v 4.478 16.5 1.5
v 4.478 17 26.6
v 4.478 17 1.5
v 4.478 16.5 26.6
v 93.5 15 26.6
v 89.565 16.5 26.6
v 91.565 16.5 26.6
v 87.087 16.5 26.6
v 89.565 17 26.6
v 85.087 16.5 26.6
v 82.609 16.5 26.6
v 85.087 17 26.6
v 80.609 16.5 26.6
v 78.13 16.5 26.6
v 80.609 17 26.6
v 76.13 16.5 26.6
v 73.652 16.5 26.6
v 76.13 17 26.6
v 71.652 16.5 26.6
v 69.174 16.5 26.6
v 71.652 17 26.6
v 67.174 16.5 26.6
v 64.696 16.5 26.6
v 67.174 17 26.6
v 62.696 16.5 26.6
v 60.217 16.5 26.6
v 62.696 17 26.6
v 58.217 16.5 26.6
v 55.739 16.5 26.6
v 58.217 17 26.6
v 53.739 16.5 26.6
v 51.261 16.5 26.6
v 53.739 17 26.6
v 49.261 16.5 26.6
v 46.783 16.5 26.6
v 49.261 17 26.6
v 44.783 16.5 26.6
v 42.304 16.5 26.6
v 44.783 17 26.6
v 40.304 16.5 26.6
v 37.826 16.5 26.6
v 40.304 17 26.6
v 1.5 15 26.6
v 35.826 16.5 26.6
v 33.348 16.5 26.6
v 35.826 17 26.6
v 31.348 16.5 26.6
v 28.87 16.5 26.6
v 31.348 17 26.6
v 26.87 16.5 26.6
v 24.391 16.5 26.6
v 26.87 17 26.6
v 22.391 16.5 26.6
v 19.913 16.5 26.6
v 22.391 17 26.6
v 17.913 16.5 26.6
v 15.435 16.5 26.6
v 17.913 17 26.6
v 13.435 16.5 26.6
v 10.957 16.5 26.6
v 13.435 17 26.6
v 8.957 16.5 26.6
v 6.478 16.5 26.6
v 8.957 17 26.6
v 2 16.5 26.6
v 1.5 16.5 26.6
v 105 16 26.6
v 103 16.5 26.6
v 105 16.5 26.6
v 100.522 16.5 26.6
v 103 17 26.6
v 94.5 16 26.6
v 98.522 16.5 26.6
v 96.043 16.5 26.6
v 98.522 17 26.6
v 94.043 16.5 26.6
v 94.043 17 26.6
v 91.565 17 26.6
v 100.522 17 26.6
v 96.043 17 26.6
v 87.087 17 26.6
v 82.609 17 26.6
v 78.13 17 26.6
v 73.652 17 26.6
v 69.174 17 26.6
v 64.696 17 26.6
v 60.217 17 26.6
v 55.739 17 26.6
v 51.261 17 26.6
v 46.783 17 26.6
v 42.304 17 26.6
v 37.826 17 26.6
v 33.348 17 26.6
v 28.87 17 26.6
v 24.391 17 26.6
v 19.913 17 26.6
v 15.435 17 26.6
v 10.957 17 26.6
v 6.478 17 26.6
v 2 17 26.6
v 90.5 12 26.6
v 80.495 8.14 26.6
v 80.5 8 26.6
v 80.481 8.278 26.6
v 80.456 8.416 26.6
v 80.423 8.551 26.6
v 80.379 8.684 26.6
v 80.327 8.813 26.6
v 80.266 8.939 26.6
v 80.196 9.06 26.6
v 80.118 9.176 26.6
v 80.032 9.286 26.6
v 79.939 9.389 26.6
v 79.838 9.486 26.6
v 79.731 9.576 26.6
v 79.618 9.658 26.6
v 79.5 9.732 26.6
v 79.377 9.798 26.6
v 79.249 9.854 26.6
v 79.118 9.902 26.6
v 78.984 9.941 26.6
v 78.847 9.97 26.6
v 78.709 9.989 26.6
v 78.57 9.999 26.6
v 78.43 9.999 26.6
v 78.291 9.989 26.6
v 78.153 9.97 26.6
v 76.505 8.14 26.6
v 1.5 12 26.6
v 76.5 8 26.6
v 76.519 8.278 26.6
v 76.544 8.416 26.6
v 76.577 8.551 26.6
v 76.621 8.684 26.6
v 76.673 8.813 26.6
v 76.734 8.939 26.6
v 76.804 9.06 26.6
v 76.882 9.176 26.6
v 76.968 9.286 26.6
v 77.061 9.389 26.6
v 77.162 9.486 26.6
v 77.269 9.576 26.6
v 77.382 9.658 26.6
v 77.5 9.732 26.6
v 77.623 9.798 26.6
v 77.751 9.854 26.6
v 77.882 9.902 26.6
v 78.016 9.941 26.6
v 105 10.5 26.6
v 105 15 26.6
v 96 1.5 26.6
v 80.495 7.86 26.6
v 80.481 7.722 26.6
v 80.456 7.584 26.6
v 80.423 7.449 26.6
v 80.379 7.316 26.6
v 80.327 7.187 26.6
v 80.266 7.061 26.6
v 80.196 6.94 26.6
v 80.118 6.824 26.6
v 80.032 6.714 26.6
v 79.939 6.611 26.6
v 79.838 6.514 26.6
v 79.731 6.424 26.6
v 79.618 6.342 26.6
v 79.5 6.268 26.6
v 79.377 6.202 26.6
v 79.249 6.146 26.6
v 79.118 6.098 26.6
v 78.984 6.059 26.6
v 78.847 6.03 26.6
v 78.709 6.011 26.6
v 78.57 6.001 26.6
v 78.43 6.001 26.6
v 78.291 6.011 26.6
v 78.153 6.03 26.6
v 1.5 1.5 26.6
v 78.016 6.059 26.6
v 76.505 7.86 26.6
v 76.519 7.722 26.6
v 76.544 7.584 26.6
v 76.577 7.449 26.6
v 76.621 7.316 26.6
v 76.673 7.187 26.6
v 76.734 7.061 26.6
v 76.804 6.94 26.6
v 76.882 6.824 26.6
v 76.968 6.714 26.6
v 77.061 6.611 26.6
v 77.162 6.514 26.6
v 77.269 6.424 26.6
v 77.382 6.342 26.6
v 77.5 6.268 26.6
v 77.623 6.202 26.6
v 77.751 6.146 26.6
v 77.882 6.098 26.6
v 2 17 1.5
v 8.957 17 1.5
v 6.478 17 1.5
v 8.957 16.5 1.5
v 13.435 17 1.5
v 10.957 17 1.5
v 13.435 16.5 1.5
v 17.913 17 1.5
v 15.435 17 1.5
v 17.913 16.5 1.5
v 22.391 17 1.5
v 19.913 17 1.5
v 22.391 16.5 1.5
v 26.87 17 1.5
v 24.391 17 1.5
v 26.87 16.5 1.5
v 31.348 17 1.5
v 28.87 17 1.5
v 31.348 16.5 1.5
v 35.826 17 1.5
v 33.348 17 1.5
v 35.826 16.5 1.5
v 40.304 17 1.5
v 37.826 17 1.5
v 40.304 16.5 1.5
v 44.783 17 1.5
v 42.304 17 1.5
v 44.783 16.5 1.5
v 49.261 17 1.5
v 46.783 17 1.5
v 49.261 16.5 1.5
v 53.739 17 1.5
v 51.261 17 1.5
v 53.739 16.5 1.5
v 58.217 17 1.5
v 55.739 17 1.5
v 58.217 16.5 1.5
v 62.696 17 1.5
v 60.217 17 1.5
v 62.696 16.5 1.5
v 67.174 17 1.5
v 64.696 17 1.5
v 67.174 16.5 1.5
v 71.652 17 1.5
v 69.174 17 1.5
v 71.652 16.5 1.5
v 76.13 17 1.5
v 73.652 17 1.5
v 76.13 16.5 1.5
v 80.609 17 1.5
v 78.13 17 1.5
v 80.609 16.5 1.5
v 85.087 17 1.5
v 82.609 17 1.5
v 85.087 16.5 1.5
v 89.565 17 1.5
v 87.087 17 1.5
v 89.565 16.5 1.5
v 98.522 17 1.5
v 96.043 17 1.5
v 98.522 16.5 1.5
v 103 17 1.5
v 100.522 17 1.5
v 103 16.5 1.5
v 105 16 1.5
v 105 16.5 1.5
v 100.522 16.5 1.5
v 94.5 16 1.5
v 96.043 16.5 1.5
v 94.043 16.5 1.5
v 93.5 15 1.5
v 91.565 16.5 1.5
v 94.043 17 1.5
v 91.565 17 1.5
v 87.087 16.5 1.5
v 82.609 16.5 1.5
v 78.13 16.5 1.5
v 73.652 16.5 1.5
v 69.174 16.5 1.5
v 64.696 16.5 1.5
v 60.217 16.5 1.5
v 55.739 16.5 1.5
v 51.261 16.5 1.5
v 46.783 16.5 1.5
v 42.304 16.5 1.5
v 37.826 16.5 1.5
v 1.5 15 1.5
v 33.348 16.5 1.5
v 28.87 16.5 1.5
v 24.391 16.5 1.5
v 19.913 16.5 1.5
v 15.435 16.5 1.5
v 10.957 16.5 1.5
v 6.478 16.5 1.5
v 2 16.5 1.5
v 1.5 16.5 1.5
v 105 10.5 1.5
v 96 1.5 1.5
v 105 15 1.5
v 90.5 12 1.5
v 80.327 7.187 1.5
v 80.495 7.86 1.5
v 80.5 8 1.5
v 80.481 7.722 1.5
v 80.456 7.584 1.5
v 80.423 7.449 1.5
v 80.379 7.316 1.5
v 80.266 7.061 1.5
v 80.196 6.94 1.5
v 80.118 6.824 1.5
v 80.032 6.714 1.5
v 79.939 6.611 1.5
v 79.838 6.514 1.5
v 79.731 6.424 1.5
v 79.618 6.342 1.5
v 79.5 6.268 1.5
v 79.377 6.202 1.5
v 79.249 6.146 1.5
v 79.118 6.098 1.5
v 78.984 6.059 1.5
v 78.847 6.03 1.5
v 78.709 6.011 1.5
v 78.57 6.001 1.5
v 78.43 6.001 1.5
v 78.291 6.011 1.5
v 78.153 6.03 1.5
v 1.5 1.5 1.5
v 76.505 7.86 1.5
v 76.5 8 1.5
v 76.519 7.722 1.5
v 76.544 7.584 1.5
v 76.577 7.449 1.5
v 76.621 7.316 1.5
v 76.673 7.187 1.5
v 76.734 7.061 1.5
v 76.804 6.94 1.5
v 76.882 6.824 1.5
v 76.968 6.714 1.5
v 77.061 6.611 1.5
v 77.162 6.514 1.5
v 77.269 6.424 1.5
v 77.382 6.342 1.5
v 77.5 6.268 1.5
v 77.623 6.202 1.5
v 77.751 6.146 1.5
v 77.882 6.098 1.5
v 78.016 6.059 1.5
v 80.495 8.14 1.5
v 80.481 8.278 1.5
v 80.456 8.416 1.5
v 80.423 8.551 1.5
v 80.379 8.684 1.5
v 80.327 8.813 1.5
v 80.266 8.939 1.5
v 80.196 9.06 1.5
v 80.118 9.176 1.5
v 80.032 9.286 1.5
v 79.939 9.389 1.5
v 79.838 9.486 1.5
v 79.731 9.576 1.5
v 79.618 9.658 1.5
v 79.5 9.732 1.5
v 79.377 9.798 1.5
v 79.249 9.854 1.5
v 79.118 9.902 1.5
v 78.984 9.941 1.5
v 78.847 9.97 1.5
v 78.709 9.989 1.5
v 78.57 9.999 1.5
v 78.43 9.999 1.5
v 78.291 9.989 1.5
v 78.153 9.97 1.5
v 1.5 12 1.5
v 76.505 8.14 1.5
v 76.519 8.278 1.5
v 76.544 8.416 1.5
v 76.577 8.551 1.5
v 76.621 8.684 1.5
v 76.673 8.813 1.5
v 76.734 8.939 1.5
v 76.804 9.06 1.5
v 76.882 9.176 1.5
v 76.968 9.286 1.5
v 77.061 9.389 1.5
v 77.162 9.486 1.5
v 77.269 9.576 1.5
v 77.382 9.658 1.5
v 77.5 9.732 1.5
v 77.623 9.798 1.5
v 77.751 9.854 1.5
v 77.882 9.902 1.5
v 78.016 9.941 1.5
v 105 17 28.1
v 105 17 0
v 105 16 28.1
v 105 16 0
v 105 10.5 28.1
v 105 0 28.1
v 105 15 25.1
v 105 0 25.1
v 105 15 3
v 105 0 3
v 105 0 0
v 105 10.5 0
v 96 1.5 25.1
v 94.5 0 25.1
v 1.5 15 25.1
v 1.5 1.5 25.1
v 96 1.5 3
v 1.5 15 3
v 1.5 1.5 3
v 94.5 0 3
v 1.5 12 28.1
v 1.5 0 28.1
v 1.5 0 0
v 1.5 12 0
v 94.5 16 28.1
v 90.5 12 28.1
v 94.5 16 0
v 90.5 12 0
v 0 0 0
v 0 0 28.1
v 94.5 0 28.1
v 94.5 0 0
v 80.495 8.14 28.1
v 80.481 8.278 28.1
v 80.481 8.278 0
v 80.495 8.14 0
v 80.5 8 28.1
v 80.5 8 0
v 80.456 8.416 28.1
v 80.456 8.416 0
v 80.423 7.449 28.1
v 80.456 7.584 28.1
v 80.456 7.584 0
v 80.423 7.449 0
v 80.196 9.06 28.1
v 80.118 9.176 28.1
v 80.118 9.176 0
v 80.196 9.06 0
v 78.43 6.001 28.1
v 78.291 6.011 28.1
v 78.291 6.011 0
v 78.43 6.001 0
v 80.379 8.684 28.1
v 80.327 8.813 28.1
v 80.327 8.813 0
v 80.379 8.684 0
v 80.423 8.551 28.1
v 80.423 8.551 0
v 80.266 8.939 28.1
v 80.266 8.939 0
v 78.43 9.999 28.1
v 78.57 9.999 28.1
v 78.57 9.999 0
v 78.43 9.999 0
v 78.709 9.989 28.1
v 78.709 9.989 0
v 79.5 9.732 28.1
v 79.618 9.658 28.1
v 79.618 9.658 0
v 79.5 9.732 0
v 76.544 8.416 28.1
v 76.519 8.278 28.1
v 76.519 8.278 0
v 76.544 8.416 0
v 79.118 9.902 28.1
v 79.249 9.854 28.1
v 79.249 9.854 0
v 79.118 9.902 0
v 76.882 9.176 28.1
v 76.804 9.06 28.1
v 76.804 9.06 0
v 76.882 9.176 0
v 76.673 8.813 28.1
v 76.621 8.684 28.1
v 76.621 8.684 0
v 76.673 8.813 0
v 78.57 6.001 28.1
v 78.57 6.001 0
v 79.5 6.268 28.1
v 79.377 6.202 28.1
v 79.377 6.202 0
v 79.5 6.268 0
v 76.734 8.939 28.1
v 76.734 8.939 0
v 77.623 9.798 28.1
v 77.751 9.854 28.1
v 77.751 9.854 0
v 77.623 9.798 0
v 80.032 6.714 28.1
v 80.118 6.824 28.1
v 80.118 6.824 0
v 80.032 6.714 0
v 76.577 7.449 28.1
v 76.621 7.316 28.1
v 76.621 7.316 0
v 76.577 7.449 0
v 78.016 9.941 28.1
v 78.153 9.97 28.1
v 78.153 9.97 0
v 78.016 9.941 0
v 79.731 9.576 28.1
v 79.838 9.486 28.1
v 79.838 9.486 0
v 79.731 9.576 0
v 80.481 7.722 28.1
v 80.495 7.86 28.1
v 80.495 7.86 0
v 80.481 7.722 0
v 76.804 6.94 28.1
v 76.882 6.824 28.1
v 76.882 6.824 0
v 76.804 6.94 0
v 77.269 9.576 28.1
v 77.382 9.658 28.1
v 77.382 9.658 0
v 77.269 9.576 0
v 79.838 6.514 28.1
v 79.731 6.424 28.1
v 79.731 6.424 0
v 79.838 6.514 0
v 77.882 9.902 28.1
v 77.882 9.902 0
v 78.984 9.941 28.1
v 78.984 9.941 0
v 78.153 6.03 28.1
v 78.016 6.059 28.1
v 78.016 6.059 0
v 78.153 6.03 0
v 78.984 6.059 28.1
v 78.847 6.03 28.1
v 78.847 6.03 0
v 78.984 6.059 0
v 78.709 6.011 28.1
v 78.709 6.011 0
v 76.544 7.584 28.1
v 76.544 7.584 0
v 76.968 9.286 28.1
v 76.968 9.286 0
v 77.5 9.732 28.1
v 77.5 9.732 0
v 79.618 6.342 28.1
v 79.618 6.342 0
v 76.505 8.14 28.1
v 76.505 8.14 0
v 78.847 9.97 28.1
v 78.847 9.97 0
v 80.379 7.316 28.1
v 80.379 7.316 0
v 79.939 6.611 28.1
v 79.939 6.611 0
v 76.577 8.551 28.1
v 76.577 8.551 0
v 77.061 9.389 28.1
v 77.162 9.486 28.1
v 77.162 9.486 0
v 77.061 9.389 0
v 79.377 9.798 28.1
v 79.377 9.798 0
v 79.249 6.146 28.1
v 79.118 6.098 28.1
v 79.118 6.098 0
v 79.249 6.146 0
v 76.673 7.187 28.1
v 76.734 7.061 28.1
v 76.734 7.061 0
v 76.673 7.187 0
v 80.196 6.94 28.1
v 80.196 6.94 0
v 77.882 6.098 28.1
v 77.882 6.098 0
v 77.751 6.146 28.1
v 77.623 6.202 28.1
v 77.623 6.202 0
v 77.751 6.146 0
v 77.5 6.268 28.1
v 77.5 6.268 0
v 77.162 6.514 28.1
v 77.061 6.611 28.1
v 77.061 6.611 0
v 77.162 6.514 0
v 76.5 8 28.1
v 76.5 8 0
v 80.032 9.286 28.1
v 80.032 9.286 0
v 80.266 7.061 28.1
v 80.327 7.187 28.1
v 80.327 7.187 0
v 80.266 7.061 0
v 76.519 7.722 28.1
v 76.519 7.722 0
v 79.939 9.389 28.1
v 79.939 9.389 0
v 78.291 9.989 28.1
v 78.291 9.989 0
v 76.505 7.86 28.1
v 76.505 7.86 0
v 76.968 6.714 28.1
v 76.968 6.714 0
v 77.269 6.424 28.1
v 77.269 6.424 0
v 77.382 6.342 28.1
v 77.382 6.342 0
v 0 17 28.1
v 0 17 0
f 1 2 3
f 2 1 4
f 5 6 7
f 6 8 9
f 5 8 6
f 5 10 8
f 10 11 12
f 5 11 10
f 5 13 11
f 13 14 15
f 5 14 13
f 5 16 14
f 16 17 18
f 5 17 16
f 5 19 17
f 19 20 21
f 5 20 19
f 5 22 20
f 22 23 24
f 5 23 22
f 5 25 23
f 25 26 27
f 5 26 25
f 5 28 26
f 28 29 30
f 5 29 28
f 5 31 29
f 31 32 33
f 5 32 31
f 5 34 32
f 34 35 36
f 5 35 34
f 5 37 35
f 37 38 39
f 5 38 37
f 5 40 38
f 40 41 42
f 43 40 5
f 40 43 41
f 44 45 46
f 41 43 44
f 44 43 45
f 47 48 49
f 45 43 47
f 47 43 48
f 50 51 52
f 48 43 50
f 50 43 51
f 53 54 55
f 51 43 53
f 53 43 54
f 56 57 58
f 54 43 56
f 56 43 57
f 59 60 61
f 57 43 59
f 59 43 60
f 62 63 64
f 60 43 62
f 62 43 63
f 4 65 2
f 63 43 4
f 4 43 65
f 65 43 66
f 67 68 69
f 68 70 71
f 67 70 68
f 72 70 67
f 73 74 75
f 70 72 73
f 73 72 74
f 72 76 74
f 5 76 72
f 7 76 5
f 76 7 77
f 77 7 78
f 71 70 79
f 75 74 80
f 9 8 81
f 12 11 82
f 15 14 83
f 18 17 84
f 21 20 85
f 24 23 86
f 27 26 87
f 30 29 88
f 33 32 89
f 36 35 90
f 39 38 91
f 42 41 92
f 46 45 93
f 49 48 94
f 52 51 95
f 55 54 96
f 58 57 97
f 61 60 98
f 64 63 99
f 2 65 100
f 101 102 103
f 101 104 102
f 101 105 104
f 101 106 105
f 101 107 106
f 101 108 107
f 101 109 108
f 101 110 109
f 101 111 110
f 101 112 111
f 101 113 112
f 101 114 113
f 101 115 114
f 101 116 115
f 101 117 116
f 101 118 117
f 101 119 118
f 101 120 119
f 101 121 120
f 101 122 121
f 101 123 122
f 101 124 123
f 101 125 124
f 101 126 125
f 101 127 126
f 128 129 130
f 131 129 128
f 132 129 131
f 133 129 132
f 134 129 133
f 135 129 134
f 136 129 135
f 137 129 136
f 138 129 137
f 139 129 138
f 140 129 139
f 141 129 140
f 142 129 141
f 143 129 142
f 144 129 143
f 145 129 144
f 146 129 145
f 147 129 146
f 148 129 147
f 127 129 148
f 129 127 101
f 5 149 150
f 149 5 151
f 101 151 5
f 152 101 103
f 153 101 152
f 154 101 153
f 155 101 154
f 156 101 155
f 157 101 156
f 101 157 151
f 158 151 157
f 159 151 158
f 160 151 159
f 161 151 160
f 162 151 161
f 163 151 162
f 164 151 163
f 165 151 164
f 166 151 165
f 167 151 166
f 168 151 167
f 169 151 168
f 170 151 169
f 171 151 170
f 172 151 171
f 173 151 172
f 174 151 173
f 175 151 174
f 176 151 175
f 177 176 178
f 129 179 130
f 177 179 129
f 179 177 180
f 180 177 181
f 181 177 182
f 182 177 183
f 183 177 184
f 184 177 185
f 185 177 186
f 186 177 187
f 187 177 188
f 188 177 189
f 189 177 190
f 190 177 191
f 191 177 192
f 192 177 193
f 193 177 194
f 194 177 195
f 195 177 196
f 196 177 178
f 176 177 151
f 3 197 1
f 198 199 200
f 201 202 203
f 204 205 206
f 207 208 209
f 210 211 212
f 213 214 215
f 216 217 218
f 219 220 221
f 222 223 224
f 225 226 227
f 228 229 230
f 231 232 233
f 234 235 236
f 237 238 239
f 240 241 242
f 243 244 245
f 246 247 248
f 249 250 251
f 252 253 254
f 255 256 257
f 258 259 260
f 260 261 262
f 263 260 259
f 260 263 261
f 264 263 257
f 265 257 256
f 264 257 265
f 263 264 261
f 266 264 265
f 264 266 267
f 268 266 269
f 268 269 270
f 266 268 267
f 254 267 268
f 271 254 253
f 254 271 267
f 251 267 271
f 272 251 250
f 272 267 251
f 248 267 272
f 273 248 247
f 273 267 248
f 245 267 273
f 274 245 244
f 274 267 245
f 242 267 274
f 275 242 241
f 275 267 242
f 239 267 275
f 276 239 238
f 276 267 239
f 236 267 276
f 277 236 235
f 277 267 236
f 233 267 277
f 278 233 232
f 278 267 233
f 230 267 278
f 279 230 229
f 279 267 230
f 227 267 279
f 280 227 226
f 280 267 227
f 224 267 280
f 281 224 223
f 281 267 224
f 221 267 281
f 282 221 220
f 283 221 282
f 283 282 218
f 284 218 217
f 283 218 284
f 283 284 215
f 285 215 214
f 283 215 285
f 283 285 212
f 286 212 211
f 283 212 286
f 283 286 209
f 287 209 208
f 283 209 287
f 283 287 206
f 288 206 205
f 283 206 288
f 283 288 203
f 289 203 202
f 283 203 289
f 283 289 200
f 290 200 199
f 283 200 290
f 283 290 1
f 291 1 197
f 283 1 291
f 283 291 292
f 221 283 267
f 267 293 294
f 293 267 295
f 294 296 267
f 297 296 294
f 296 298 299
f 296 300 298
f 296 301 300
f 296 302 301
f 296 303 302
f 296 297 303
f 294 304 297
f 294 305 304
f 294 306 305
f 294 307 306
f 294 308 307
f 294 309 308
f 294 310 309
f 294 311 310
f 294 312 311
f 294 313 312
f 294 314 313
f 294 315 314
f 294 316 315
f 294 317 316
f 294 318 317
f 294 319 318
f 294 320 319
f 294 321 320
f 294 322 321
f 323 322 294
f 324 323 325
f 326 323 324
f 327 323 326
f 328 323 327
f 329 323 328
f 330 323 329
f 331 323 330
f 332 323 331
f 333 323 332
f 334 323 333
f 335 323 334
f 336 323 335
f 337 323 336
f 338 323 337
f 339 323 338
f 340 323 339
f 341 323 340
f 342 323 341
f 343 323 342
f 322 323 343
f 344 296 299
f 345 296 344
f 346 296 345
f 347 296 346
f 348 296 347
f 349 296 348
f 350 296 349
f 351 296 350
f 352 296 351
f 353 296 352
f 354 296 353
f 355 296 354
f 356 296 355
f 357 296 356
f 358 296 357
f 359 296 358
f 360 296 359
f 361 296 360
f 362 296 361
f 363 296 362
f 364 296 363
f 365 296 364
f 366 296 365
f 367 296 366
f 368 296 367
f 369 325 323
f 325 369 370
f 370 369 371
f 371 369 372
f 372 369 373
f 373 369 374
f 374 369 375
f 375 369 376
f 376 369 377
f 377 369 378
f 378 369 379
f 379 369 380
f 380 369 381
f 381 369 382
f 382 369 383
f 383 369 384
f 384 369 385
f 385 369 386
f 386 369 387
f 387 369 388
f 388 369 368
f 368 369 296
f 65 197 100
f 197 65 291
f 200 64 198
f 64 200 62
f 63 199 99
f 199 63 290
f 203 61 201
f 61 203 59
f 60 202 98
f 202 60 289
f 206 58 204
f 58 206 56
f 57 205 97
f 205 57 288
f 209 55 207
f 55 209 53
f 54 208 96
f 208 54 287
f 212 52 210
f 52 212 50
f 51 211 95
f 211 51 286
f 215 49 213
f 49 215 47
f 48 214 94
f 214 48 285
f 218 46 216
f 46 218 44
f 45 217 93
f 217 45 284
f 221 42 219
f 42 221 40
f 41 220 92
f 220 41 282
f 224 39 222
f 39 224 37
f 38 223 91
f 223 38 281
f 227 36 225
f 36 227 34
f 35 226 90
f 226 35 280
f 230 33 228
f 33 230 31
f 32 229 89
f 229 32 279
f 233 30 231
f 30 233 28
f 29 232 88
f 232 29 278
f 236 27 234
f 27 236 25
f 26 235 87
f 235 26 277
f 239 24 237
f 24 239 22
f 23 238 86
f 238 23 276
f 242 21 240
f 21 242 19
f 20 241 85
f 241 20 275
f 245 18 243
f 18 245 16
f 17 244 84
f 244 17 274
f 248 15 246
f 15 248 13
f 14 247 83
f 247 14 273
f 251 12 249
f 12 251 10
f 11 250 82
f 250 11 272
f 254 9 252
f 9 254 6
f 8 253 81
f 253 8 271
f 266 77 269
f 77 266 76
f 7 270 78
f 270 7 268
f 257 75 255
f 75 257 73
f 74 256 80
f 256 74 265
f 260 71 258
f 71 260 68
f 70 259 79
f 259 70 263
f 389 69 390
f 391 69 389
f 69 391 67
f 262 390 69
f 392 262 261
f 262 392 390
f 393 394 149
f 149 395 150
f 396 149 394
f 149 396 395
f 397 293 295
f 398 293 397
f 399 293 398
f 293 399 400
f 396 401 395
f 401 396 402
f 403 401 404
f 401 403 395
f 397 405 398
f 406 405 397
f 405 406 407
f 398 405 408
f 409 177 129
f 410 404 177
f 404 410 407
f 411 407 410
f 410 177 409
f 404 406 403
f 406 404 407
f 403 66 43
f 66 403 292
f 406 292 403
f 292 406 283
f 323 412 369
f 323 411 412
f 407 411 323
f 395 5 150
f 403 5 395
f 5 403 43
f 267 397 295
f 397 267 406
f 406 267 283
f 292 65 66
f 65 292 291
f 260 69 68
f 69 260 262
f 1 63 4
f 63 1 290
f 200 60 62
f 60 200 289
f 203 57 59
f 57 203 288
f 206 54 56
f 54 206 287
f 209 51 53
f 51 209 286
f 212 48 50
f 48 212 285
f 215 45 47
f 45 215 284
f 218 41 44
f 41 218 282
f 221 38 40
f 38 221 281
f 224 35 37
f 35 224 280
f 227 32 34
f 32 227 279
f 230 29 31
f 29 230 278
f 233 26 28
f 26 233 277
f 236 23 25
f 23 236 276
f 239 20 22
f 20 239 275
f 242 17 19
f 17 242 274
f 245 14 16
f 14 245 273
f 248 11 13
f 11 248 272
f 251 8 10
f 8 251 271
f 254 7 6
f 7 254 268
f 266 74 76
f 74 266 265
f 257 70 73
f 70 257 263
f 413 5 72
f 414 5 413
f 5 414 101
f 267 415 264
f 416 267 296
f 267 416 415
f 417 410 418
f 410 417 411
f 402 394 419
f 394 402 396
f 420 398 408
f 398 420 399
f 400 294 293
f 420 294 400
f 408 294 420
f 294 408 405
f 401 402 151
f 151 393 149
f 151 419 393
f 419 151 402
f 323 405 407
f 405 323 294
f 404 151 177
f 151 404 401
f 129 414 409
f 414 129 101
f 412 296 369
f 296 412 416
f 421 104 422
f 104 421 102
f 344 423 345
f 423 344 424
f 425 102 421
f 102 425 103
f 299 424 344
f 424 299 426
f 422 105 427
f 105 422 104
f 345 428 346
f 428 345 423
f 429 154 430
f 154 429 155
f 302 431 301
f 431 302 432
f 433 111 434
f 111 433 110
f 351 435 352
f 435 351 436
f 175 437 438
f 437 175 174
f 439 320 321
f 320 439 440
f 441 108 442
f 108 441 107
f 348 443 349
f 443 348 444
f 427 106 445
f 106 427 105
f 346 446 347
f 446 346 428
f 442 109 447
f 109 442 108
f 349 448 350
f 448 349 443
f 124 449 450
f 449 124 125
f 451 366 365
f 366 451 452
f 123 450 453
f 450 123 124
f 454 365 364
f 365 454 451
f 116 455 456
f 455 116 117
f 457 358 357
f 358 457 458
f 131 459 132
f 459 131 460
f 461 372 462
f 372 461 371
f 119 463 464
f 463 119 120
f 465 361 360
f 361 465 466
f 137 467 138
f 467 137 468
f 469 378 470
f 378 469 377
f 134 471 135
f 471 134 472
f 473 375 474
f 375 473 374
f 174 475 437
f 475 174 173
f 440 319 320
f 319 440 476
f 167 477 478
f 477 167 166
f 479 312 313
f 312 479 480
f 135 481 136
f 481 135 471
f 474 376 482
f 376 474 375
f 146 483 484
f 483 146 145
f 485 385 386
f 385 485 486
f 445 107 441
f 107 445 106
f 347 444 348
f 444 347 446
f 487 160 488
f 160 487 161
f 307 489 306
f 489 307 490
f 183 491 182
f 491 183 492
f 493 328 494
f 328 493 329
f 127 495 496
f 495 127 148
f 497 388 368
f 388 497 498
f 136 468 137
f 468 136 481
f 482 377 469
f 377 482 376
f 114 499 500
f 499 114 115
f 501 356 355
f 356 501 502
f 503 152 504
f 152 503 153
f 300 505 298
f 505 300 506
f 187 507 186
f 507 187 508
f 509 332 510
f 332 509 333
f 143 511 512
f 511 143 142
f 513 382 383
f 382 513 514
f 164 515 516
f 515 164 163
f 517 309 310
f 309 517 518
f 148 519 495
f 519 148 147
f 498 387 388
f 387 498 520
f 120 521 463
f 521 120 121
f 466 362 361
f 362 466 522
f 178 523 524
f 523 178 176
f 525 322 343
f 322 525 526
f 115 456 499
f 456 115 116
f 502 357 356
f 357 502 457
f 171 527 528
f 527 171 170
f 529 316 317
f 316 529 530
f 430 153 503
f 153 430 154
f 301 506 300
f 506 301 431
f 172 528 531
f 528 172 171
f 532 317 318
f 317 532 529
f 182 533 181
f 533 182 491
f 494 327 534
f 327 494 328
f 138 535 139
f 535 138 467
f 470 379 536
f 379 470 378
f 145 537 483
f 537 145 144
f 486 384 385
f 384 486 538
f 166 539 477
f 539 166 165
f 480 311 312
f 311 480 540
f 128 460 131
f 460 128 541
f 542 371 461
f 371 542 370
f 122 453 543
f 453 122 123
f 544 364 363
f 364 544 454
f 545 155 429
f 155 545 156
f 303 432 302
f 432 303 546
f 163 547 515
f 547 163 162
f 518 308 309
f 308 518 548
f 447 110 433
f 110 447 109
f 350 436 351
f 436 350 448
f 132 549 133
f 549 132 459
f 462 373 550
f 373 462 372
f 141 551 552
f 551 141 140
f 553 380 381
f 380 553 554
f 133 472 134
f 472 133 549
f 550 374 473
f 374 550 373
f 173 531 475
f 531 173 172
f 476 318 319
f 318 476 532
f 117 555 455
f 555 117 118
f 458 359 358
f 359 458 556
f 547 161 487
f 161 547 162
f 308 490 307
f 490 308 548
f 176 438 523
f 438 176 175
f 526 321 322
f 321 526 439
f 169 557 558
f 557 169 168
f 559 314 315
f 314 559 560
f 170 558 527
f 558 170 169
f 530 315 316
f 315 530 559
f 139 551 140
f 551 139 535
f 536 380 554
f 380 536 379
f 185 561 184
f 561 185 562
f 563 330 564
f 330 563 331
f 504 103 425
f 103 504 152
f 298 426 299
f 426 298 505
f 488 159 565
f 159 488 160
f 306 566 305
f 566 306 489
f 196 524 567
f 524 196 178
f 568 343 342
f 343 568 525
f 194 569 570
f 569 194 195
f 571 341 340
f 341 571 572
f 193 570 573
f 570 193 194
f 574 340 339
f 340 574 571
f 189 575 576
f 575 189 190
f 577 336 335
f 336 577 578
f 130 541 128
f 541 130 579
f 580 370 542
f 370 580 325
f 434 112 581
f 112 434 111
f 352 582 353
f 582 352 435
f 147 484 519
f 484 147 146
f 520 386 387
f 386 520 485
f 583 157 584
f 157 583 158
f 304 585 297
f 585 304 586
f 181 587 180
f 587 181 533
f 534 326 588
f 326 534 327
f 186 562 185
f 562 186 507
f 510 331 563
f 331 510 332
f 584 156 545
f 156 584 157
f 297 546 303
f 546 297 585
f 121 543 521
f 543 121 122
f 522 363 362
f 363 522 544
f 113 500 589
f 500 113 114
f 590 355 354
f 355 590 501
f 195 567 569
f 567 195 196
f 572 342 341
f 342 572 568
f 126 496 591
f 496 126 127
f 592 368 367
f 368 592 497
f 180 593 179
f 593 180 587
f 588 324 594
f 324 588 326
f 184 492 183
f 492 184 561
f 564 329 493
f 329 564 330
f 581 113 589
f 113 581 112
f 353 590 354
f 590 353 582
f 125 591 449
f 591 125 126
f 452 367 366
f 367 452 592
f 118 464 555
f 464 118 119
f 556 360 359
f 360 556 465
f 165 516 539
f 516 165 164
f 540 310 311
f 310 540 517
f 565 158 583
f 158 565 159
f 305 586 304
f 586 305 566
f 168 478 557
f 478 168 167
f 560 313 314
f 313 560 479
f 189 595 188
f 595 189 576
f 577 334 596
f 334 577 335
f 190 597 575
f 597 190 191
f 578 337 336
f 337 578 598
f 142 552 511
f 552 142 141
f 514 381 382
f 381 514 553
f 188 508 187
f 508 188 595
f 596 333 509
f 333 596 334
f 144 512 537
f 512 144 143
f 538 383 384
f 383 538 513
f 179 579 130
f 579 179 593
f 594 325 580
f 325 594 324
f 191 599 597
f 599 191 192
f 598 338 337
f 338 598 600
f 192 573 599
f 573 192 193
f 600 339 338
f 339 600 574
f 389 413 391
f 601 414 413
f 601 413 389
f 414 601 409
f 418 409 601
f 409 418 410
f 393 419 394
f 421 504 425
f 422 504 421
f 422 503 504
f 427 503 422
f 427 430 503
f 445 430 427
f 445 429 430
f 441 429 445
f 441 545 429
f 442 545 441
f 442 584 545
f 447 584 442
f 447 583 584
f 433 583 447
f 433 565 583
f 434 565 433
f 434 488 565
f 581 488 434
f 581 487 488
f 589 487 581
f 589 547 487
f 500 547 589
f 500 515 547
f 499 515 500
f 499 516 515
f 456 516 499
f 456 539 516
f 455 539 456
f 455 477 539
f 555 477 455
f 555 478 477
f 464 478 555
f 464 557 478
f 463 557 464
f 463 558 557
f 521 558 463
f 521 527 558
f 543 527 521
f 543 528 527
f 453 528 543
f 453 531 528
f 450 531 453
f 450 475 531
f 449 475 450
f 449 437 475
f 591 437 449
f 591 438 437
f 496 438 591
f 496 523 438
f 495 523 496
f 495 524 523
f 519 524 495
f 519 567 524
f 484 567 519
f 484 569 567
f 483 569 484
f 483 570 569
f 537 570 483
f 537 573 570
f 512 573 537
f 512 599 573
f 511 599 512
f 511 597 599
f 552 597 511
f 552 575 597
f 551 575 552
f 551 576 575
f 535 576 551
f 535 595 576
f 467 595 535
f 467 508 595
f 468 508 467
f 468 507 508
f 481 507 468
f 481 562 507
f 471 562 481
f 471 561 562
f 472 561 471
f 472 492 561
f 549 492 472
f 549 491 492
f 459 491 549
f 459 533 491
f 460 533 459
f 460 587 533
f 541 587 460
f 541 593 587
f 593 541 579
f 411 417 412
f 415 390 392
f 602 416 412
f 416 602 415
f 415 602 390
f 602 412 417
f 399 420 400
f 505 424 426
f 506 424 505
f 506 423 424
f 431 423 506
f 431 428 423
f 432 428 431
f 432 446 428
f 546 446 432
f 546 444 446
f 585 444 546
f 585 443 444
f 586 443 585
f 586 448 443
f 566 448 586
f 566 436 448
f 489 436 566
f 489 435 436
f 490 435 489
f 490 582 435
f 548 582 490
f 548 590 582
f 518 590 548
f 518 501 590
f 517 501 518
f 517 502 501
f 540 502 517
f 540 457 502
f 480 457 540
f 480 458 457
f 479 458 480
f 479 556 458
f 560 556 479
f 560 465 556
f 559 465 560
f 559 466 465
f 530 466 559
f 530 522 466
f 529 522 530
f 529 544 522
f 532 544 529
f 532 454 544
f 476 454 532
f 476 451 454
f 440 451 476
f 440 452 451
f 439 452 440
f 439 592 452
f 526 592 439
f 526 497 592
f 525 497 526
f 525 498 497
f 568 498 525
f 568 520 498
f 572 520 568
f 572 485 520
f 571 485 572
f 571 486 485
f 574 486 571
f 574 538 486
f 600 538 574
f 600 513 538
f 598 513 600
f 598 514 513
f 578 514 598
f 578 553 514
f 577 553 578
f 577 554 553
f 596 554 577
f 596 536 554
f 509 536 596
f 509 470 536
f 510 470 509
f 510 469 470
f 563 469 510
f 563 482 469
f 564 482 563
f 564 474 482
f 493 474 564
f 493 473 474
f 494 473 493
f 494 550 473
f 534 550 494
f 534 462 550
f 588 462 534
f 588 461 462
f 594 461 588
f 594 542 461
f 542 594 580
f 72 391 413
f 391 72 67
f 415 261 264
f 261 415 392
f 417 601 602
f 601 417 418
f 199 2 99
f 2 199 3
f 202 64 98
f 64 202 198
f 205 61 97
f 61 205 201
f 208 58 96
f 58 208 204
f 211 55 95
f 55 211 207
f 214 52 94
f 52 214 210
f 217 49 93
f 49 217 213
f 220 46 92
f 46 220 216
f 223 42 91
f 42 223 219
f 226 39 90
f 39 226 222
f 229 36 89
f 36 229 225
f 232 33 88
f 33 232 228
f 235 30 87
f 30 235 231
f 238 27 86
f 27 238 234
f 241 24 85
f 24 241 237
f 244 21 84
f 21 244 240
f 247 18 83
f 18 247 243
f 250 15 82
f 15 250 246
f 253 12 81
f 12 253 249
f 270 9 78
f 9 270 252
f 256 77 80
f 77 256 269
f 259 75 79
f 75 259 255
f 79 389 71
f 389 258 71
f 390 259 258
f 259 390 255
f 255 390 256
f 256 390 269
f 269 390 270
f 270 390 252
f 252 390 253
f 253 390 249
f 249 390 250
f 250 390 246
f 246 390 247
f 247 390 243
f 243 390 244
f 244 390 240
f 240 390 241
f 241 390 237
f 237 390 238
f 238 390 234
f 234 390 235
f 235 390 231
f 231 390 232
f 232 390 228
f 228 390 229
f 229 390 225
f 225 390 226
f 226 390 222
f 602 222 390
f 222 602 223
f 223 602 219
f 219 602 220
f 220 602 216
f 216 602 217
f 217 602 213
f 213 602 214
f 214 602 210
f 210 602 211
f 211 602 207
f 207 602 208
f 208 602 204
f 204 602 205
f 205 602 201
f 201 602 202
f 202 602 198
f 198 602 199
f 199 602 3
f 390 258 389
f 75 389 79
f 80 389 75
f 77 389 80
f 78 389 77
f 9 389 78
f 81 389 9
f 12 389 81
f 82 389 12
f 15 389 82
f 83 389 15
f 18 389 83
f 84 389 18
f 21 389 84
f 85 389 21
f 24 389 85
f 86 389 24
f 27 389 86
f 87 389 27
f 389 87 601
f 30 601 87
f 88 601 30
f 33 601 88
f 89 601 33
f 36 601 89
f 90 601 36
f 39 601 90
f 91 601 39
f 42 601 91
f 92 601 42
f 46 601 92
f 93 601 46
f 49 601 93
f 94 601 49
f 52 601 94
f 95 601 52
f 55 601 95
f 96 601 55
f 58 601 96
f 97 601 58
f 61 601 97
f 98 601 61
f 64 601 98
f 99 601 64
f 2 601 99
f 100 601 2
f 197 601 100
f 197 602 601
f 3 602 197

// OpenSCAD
// file: hdd-front-latch.scad
/*

    latch
    
    By Anton Augustsson


*/

$fn=90;  // accuracy

module hddLatch (
    thumbDepth,
    thumbHeight,
    sliderHeight,
    lockLength,
    thickness,
    thicknessFront,
    trayHeight,
    trayWidth,
    trayFrontLength,
    hddWidth,
    hddLenght,
    x,y,z
    ){
/*
    ---------- Local varibles ---------- 
*/


latchWidth = trayWidth;

latchThicnkess = thumbDepth-thickness*2;
lockWidth = 8;
lockLenght = 4;
        
rodDiameter = 4;
        
/*
    ---------- Code ---------- 
*/

translate([
    x,
    y,
    z]) 
rotate ([0,0,0])
difference () {
union () {
    
// Latch
translate([
    0,
    0,
    0]) 
cube(size = [
    latchWidth+lockWidth,
    latchThicnkess+lockLenght,
    trayHeight]);

/* Rod
translate([
    trayWidth-lockWidth*7/2,
    (latchThicnkess+lockLenght)/2,
    0])
cylinder(
    h = trayHeight,
    r = rodDiameter/2
    );
*/    
}

union () {
    
// Remove middle
translate([
    -1,
    thickness,
    thickness]) 
cube(size = [
    latchWidth+lockWidth+2,
    latchThicnkess+lockLenght,
    trayHeight-thickness*2]);

// Remove for lock
translate([
    latchWidth,
    -1,
    -1]) 
cube(size = [
    lockWidth+1,
    latchThicnkess+1,
    trayHeight+2]);

// Remove extra
translate([
    -1,
    latchThicnkess,
    -1]) 
cube(size = [
    latchWidth-lockWidth*2+1,
    lockLenght+1,
    trayHeight+2]);

// Removal triangle 1
translate([
    latchWidth-lockWidth,
    latchThicnkess+lockWidth,
    -1]) 
rotate ([0,0,180]) 
difference () {
cube(size = [
    lockWidth,
    lockWidth,
    trayHeight+2]);
translate([
    0,
    0,
    -1]) 
rotate ([0,0,45]) 
cube(size = [
    lockWidth*sqrt(2),
    lockWidth,
    trayHeight+4]);    
}

// Removal triangle 2
translate([
    latchWidth-latchThicnkess,
    0,
    -1]) 
difference () {
cube(size = [
    latchThicnkess,
    latchThicnkess,
    trayHeight+2]);
translate([
    0,
    0,
    -1]) 
rotate ([0,0,45]) 
cube(size = [
    latchThicnkess*sqrt(2),
    latchThicnkess,
    trayHeight+4]); 
}

// Remove Rod
translate([
    trayWidth-lockWidth*7/2,
    (latchThicnkess+lockLenght)/2,
    -1])
cylinder(
    h = trayHeight+2,
    r = rodDiameter/2
    );

}}}


    
/*
    ---------- Example ---------- 
*/


thicknessBottom = 2; 
thicknessFront = 2;
thickness = 1.5;

hddHeight = 26.1; 
hddWidth = 101.6;  // 4 inches
hddLenght = 147.32; // 5.8

trayHeight = hddHeight+thicknessBottom;
trayFrontLength = 15+thicknessFront; 
trayWidth = 105;
trayLenght = hddLenght+trayFrontLength;

thicknessSide = (trayWidth-hddWidth)/2;


sliderHeight = trayHeight-thickness*2;
thumbDepth = trayFrontLength
    -thicknessFront;
thumbHeight = sliderHeight-(thickness*2);

lockLength = 15;


x=0;
y=0;
z=0;


hddLatch (
    thumbDepth,
    thumbHeight,
    sliderHeight,
    lockLength,
    thickness,
    thicknessFront,
    trayHeight,
    trayWidth,
    trayFrontLength,
    hddWidth,
    hddLenght,
    x,y,z
    );
// file: hdd-front-lock.scad
/*

    Lock
    
    By Anton Augustsson


*/

$fn=90;  // accuracy

module hddLock (
    thumbDepth,
    thumbHeight,
    sliderHeight,
    lockLength,
    thickness,
    thicknessFront,
    trayHeight,
    trayWidth,
    trayLenght,
    hddWidth,
    hddLenght,
    x,y,z
    ){
/*
    ---------- Local varibles ---------- 
*/




/*
    ---------- Code ---------- 
*/

translate([
    x,
    y,
    z]) 
difference () {
union () {

// thumb lock
translate([
    0,
    0,
    0]) 
cube(size = [
    lockLength,
    thumbDepth,
    thumbHeight]);

// slider
translate([
    0,
    thumbDepth,
    -(sliderHeight-thumbHeight)/2]) 
cube(size = [
    lockLength,
    thickness,
    sliderHeight]);
}
union () {
// removal thum
translate([
    thickness*2,
    -1,
    thickness*2]) 
cube(size = [
    lockLength-thickness*4,
    thumbDepth+1,
    thumbHeight-thickness*4]);
    
}
}}


    
/*
    ---------- Example ---------- 
*/


thicknessBottom = 2; 
thicknessFront = 2;
thickness = 1.5;

hddHeight = 26.1; 
hddWidth = 101.6;  // 4 inches
hddLenght = 147.32; // 5.8

trayHeight = hddHeight+thicknessBottom;
trayFrontLength = 15+thicknessFront; 
trayWidth = 105;
trayLenght = hddLenght+trayFrontLength;

thicknessSide = (trayWidth-hddWidth)/2;


sliderHeight = trayHeight-thickness*2;
thumbDepth = trayFrontLength
    -thicknessFront;
thumbHeight = sliderHeight-(thickness*2);

lockLength = 15;


x=0;
y=0;
z=0;


hddLock (
    thumbDepth,
    thumbHeight,
    sliderHeight,
    lockLength,
    thickness,
    thicknessFront,
    trayHeight,
    trayWidth,
    trayLenght,
    hddWidth,
    hddLenght,
    x,y,z
    );
// main file
/*

    HDD Front
    
    By Anton Augustsson


*/

use <hdd-front-lock.scad>;
use <hdd-front-latch.scad>;

$fn=90;  // accuracy

module hddFront (
    thumbDepth,
    thumbHeight,
    sliderHeight,
    lockLength,
    thickness,
    thicknessFront,
    trayHeight,
    trayWidth,
    trayFrontLength,
    hddWidth,
    hddLenght,
    x,y,z
    ){
/*
    ---------- Local varibles ---------- 
*/

barWidth = 2;
numberOfBars = 24;
betweenBars = (trayWidth-barWidth*numberOfBars)
       /(numberOfBars-1);



/*
    ---------- Code ---------- 
*/

translate([
    x,
    y,
    z]) 
difference () {
union () {
   
// front back
cube(size = [
    trayWidth,
    trayFrontLength,
    trayHeight]);
    
}
union () {
// Removar for bars
for(i = [barWidth:betweenBars+barWidth:trayWidth-1])
    translate([i,trayFrontLength-1,thickness]) 
    cube(size = [
        betweenBars,
        thicknessFront+2,
        trayHeight-thickness*2]);

hddLock (
    thumbDepth+1,
    thumbHeight,
    sliderHeight,
    trayWidth-thickness,
    thickness,
    thicknessFront,
    trayHeight,
    trayWidth,
    trayLenght,
    hddWidth,
    hddLenght,
    thickness,-1,thickness*2
    );

hddLatch (
    thumbDepth,
    thumbHeight,
    sliderHeight,
    lockLength,
    thickness,
    thicknessFront,
    trayHeight,
    trayWidth,
    trayFrontLength,
    hddWidth,
    hddLenght,
    thickness,0,0
    );
    
// remove extra
translate([
    thickness,
    -1,
    thickness*3]) 
cube(size = [
    trayWidth-thickness*2,
    trayFrontLength,
    trayHeight-thickness*6]);

}
}}


    
/*
    ---------- Example ---------- 
*/


thicknessBottom = 2; 
thicknessFront = 2;
thickness = 1.5;

hddHeight = 26.1; 
hddWidth = 101.6;  // 4 inches
hddLenght = 147.32; // 5.8

trayHeight = hddHeight+thicknessBottom;
trayFrontLength = 15+thicknessFront; 
trayWidth = 105;
trayLenght = hddLenght+trayFrontLength;

thicknessSide = (trayWidth-hddWidth)/2;


sliderHeight = trayHeight-thickness*2;
thumbDepth = trayFrontLength-thicknessFront;
thumbHeight = sliderHeight-(thickness*2);

lockLength = 15;


x=0;
y=0;
z=0;


hddFront  (
    thumbDepth,
    thumbHeight,
    sliderHeight,
    lockLength,
    thickness,
    thicknessFront,
    trayHeight,
    trayWidth,
    trayFrontLength,
    hddWidth,
    hddLenght,
    x,y,z
    );
